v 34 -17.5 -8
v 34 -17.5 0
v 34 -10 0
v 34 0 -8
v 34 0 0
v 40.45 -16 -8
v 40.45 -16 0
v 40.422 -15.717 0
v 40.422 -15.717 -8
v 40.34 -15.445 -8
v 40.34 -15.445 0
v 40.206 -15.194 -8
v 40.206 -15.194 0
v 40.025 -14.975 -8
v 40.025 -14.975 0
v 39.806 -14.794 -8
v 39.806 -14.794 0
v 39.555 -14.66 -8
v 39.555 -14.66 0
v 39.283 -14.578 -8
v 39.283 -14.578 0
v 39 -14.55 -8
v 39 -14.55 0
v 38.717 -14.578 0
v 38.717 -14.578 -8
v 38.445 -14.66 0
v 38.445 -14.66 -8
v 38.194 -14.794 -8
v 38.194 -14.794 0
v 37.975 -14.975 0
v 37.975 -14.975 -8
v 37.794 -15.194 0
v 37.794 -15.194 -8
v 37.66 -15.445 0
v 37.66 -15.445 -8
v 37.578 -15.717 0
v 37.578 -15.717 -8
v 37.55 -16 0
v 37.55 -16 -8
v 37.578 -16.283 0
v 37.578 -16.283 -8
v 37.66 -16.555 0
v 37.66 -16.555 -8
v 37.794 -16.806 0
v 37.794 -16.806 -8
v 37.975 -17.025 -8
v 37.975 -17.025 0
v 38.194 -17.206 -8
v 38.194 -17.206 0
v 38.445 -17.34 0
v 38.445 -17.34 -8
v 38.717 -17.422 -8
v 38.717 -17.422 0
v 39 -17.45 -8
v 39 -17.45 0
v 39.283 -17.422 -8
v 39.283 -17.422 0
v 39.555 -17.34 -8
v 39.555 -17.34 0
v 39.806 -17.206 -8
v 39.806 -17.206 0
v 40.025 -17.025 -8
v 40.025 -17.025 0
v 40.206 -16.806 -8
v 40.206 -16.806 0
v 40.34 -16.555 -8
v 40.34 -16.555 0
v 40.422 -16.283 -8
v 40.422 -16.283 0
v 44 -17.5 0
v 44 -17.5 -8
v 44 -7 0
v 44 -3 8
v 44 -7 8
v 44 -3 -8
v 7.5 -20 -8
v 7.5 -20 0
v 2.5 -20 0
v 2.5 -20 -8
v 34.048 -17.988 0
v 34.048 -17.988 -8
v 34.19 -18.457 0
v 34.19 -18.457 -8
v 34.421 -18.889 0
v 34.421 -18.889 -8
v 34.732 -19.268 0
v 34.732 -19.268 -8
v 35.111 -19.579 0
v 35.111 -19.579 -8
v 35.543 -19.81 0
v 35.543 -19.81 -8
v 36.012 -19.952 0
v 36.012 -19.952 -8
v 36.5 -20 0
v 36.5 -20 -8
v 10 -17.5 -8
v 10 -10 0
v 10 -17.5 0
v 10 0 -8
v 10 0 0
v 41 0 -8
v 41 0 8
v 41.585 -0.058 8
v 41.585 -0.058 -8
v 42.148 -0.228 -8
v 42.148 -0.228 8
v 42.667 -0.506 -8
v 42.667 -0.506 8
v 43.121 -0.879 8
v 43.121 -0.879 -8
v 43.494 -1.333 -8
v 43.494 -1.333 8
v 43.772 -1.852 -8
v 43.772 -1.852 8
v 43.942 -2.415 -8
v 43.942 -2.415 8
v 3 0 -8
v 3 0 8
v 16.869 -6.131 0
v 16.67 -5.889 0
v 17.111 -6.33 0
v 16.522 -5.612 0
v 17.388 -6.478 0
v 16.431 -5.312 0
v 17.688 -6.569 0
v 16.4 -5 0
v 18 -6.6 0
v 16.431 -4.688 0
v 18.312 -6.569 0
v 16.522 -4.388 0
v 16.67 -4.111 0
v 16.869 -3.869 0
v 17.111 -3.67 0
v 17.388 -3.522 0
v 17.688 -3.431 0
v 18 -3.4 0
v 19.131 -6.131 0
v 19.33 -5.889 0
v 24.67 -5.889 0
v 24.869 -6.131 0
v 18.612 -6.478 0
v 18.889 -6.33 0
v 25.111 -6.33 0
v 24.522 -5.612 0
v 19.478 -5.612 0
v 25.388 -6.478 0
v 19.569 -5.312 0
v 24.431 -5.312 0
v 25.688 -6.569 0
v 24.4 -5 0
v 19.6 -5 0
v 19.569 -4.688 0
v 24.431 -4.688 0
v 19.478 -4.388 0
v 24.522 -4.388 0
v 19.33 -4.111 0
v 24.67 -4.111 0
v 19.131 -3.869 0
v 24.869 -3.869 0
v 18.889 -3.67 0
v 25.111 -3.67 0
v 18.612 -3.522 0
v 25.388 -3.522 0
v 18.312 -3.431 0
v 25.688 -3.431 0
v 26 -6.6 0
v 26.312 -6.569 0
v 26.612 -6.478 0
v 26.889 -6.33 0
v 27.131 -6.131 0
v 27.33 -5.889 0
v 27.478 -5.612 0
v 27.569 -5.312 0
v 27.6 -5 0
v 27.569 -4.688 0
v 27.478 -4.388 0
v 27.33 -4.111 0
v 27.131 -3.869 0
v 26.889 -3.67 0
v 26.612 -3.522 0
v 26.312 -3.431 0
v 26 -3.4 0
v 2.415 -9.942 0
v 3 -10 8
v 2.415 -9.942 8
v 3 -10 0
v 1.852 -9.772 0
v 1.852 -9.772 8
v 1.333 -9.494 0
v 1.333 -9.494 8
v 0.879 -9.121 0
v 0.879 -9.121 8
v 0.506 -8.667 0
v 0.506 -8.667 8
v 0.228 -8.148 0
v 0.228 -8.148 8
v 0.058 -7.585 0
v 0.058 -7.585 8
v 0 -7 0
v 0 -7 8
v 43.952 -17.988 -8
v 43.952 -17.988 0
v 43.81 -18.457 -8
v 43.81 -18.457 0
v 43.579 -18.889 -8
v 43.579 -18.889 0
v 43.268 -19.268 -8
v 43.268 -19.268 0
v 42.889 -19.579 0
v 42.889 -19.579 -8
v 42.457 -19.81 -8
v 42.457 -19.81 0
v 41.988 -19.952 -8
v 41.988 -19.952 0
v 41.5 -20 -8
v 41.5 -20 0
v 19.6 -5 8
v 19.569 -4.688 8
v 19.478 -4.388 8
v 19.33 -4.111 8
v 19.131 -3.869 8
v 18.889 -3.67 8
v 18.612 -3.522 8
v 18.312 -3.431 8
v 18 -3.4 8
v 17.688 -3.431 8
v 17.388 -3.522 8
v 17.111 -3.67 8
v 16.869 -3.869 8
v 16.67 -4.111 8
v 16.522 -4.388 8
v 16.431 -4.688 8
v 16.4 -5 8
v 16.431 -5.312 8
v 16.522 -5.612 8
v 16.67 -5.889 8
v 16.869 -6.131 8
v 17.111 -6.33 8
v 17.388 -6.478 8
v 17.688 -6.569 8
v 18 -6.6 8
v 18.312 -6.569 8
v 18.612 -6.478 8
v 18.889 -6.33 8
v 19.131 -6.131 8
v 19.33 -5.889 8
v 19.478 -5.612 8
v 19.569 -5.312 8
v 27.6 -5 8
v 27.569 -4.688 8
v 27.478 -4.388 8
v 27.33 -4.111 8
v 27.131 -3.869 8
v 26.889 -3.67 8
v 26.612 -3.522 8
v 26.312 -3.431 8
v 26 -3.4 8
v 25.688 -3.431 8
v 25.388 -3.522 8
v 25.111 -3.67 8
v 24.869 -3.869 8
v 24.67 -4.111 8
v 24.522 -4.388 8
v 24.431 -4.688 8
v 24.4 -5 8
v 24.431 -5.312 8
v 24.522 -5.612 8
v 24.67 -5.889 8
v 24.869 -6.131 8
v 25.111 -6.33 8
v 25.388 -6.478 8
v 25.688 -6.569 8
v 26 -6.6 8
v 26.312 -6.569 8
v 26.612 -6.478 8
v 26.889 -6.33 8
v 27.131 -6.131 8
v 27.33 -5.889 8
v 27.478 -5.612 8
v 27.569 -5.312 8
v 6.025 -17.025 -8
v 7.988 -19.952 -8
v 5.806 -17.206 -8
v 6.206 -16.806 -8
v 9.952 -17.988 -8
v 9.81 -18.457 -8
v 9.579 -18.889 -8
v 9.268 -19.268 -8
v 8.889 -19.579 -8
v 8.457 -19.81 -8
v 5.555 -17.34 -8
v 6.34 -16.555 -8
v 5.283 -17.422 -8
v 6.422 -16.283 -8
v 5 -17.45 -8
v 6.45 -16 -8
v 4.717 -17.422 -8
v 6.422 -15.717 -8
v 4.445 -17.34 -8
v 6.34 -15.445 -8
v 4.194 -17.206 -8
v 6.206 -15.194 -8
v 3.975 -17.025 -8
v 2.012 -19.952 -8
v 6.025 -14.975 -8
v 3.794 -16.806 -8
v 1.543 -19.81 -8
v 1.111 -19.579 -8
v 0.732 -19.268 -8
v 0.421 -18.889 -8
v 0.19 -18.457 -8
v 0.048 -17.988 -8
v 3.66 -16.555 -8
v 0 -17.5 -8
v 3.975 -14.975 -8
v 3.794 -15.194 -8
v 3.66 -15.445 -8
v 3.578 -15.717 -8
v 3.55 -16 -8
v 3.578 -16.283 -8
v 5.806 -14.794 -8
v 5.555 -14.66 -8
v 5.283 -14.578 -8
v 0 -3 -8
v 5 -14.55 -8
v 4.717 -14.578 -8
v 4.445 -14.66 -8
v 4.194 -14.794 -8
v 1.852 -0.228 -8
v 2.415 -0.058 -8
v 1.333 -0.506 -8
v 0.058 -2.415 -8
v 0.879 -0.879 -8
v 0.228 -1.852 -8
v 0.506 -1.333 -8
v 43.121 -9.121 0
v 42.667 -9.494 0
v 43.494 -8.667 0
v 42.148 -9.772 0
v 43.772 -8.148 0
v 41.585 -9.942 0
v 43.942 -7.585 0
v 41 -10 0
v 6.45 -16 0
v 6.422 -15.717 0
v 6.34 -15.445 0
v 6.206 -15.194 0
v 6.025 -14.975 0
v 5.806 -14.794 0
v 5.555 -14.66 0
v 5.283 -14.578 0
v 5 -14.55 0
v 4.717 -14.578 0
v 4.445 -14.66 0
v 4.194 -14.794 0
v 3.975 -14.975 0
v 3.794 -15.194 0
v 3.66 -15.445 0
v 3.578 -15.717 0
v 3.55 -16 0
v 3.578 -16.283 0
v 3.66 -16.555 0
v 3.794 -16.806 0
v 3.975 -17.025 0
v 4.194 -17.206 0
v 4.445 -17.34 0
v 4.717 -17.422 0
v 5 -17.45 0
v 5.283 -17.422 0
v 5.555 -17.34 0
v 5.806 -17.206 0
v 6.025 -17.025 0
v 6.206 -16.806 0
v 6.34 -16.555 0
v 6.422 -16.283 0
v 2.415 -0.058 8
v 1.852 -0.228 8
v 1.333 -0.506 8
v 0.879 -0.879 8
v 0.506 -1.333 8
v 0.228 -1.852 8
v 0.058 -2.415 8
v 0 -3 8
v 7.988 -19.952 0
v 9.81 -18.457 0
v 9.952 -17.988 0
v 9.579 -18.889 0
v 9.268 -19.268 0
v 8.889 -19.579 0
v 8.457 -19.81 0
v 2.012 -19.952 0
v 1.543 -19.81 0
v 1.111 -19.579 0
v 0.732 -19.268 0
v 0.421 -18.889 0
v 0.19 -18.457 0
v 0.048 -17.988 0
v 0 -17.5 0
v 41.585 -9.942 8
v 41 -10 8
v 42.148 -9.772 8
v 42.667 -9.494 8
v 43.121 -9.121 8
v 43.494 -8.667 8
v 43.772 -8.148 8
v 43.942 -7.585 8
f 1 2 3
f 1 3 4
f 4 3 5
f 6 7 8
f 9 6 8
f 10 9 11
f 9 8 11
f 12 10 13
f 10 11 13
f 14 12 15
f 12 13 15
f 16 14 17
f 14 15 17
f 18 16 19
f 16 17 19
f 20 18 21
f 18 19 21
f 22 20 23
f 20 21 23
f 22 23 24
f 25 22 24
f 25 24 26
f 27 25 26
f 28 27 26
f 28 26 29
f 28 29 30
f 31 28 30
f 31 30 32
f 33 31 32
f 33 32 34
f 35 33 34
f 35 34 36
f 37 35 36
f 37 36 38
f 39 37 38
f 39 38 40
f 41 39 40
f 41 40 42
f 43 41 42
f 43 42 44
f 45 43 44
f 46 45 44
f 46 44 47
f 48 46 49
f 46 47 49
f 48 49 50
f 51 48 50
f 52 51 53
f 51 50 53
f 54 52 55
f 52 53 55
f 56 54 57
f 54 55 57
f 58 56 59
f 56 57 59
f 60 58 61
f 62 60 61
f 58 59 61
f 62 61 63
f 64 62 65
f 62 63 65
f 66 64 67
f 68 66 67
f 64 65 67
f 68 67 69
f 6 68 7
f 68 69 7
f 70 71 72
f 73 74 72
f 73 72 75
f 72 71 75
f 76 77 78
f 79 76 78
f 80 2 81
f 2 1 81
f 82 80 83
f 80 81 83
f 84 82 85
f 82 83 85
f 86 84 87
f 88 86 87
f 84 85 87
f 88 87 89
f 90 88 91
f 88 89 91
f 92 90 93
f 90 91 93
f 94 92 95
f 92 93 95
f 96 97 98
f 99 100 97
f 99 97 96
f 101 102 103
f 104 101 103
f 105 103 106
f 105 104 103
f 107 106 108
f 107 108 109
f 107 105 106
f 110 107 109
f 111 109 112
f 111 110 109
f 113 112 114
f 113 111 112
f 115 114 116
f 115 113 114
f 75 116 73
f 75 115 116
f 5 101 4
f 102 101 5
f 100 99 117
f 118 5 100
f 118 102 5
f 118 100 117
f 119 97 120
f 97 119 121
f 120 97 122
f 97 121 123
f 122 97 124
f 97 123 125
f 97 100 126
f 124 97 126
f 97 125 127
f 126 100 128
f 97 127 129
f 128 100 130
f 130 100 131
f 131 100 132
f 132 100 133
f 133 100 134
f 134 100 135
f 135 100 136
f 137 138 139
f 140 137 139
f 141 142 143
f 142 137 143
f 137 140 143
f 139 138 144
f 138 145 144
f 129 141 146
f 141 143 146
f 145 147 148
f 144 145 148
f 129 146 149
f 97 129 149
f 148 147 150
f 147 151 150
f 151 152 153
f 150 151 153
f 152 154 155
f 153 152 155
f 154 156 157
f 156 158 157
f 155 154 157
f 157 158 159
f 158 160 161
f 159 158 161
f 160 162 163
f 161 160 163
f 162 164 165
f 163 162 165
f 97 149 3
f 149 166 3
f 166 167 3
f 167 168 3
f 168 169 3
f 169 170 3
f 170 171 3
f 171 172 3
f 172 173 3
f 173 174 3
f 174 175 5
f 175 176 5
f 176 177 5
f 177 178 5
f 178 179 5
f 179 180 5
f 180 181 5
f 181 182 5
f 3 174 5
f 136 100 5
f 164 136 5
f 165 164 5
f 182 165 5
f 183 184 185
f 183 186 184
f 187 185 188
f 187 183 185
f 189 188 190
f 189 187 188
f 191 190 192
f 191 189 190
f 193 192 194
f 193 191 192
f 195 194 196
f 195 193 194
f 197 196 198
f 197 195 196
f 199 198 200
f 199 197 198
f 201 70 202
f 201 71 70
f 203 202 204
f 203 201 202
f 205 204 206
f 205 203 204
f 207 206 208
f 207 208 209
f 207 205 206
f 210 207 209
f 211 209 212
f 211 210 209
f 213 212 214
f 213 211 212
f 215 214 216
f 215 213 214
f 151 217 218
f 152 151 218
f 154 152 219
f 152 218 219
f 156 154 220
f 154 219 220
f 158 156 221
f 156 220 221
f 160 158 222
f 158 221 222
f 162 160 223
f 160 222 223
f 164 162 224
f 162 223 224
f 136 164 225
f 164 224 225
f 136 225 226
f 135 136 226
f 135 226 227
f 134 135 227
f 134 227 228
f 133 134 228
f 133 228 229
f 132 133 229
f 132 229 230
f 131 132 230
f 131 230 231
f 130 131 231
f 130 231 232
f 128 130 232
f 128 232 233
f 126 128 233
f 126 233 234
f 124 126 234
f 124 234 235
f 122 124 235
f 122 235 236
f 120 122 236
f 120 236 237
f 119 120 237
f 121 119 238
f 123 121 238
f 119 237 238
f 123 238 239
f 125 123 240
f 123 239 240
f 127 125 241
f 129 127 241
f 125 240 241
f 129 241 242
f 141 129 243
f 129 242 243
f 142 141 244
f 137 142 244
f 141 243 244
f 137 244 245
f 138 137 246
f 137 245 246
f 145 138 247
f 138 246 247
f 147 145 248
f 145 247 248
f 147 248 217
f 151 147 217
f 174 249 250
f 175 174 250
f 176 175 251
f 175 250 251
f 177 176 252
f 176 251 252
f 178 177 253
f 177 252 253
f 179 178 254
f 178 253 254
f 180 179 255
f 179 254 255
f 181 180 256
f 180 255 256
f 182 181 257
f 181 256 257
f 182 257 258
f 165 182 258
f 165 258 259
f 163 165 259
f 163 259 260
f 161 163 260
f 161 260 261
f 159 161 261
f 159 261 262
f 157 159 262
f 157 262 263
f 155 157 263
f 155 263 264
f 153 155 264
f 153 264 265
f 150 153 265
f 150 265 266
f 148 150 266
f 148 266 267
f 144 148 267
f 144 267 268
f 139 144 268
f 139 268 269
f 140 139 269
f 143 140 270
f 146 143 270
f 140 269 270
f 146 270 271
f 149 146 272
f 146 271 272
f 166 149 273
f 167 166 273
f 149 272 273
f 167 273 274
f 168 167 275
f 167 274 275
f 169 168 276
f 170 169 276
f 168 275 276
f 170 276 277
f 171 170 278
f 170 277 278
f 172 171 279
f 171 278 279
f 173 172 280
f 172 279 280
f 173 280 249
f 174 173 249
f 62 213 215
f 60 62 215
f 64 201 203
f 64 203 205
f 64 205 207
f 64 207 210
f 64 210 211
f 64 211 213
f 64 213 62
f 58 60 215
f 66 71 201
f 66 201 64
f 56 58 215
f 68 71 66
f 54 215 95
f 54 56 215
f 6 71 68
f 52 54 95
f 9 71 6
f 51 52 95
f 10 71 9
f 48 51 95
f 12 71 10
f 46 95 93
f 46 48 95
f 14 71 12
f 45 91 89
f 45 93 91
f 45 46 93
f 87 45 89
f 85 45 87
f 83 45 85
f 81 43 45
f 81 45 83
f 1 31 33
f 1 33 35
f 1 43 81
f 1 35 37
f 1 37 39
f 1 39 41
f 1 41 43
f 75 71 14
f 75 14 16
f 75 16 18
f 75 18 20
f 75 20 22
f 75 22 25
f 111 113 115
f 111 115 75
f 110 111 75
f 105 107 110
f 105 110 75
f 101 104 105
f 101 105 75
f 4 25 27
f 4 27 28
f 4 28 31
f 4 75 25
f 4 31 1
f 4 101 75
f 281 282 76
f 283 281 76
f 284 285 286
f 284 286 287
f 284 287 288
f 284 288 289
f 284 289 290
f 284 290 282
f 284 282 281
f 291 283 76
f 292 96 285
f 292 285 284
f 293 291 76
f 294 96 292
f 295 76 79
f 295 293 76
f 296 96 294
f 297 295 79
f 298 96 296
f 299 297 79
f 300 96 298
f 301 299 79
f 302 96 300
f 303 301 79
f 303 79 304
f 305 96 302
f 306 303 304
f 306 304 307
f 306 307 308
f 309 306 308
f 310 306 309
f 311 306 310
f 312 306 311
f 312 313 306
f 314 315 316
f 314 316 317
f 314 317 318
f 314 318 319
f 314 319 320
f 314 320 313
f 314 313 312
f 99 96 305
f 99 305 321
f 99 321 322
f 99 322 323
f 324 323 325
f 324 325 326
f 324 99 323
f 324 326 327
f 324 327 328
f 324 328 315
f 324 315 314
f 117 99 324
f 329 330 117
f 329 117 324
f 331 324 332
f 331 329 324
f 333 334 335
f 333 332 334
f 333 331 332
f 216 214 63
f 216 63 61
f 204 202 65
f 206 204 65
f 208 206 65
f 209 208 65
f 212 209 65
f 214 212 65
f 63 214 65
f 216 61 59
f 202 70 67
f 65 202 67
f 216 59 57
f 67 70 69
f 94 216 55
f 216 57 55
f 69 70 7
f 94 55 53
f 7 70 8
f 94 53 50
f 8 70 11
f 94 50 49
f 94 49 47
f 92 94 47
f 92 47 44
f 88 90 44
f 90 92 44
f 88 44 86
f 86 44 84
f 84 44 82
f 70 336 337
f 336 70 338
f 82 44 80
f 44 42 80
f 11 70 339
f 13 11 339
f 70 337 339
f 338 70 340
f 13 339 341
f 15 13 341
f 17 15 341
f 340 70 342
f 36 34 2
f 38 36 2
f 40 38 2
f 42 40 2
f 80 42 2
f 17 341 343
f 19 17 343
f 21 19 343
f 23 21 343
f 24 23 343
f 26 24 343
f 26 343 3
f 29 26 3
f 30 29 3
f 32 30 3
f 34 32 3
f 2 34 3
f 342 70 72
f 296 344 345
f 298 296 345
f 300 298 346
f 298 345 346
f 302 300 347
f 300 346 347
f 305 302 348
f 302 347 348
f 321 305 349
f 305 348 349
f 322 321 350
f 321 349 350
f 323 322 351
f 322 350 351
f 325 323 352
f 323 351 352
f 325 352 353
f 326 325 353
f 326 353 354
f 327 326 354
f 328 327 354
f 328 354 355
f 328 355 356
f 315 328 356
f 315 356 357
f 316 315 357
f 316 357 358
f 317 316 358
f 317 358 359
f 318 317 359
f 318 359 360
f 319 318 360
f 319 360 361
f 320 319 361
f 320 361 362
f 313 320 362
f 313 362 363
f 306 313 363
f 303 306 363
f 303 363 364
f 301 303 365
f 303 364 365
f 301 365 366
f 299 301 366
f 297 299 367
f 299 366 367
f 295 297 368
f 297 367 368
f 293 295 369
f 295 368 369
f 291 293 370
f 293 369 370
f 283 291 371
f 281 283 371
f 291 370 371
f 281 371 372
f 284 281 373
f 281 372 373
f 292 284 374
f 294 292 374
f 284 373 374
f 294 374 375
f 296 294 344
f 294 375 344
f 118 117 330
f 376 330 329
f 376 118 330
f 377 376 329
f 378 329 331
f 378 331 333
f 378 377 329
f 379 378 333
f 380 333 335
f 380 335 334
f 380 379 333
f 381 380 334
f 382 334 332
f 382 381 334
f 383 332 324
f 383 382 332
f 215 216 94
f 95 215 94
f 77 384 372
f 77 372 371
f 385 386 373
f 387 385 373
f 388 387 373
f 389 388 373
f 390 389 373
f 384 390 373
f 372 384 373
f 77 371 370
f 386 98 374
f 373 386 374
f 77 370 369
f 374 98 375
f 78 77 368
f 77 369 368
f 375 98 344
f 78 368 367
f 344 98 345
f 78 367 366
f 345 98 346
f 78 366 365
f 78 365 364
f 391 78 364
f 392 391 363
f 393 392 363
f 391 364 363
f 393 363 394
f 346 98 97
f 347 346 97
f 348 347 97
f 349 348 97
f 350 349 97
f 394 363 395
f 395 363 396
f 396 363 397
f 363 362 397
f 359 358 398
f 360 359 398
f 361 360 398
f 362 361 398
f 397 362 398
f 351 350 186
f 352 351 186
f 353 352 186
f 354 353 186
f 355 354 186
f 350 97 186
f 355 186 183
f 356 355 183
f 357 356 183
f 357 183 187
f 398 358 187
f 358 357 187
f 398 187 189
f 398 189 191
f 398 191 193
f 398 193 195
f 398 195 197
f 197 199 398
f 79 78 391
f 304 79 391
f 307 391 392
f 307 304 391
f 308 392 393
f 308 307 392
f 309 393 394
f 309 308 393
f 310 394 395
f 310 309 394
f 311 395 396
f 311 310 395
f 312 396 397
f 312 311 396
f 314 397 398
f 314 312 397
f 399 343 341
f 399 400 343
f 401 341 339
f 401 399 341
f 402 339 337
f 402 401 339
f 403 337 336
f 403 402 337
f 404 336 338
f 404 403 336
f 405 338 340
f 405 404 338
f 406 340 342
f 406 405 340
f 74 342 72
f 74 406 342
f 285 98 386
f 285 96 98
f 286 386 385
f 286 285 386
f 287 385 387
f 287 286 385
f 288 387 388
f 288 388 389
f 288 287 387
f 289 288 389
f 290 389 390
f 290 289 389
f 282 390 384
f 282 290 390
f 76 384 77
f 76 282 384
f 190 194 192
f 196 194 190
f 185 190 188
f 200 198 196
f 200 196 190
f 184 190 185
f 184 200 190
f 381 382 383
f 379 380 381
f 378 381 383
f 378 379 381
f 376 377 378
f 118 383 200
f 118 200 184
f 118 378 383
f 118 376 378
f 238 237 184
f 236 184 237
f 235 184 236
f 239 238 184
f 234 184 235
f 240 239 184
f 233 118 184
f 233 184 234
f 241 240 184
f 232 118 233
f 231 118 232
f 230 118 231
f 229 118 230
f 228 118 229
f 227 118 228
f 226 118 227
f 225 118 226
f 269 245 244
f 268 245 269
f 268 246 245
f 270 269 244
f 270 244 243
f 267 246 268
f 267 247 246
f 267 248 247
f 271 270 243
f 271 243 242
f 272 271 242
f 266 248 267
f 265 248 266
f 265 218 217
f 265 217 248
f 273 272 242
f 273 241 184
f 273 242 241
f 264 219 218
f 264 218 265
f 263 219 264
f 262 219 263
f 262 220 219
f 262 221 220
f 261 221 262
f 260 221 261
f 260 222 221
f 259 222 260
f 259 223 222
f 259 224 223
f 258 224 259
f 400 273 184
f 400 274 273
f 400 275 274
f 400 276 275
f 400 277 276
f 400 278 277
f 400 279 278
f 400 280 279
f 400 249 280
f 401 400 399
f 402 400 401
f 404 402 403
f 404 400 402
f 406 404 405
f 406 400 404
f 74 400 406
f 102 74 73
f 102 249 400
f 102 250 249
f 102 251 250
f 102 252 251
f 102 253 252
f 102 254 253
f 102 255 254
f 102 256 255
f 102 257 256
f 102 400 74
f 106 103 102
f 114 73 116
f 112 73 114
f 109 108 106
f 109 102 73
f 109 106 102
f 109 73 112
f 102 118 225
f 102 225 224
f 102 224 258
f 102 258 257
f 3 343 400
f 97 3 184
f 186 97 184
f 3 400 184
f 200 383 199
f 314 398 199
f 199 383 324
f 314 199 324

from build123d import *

# Parameters (mm, degrees)
SKETCH1_W           = 44
SKETCH1_H           = 10
BOSS_EXTRUDE1_DEPTH = 8
SKETCH4_W           = 10
SKETCH4_H           = 10
BOSS_EXTRUDE2_DEPTH = 8
SKETCH3_R           = 1.6
CUT_EXTRUDE2_DEPTH  = 48.874836814
SKETCH5_W           = 10
SKETCH5_H           = 8
BOSS_EXTRUDE3_DEPTH = 10
SKETCH6_R           = 1.45
CUT_EXTRUDE3_DEPTH  = 49.989794856
FILLET2_R           = 2.5
FILLET1_R           = 3


with BuildPart() as part:
    # Sketch1 → Boss-Extrude1 (new body)
    with BuildSketch(Plane.XY):
        with Locations((22, -5)):
            Rectangle(SKETCH1_W, SKETCH1_H)
    extrude(amount=BOSS_EXTRUDE1_DEPTH)

    # Sketch4 → Boss-Extrude2 (add)
    with BuildSketch(Plane(origin=(0, 0, 0), x_dir=(-1, 0, 0), z_dir=(0, 0, -1))):
        with Locations((-5, -5)):
            Rectangle(SKETCH4_W, SKETCH4_H)
        with Locations((-39, -5)):
            Rectangle(SKETCH4_W, SKETCH4_H)
    extrude(amount=BOSS_EXTRUDE2_DEPTH)

    # Sketch3 → Cut-Extrude2 (cut, through all)
    with BuildSketch(Plane.XY.offset(8)):
        with Locations((18, -5)):
            Circle(SKETCH3_R)
        with Locations((26, -5)):
            Circle(SKETCH3_R)
    extrude(amount=-CUT_EXTRUDE2_DEPTH, mode=Mode.SUBTRACT)

    # Sketch5 → Boss-Extrude3 (add)
    with BuildSketch(Plane(origin=(0, -10, 0), x_dir=(-1, 0, 0), z_dir=(0, -1, 0))):
        with Locations((-5, 4)):
            Rectangle(SKETCH5_W, SKETCH5_H)
        with Locations((-39, 4)):
            Rectangle(SKETCH5_W, SKETCH5_H)
    extrude(amount=BOSS_EXTRUDE3_DEPTH)

    # Sketch6 → Cut-Extrude3 (cut, through all)
    with BuildSketch(Plane.XY):
        with Locations((5, -16)):
            Circle(SKETCH6_R)
        with Locations((39, -16)):
            Circle(SKETCH6_R)
    extrude(amount=-CUT_EXTRUDE3_DEPTH, mode=Mode.SUBTRACT)

    # Fillet2
    fillet2_edges = [part.edges().sort_by_distance(p)[0] for p in [
        (10, -20, -4),
        (0, -20, -4),
        (34, -20, -4),
        (44, -20, -4),
    ]]
    fillet(fillet2_edges, radius=FILLET2_R)

    # Fillet1
    fillet1_edges = [part.edges().sort_by_distance(p)[0] for p in [
        (0, 0, 0),
        (44, 0, 0),
        (44, -10, 4),
        (0, -10, 4),
    ]]
    fillet(fillet1_edges, radius=FILLET1_R)


solid = part.part
